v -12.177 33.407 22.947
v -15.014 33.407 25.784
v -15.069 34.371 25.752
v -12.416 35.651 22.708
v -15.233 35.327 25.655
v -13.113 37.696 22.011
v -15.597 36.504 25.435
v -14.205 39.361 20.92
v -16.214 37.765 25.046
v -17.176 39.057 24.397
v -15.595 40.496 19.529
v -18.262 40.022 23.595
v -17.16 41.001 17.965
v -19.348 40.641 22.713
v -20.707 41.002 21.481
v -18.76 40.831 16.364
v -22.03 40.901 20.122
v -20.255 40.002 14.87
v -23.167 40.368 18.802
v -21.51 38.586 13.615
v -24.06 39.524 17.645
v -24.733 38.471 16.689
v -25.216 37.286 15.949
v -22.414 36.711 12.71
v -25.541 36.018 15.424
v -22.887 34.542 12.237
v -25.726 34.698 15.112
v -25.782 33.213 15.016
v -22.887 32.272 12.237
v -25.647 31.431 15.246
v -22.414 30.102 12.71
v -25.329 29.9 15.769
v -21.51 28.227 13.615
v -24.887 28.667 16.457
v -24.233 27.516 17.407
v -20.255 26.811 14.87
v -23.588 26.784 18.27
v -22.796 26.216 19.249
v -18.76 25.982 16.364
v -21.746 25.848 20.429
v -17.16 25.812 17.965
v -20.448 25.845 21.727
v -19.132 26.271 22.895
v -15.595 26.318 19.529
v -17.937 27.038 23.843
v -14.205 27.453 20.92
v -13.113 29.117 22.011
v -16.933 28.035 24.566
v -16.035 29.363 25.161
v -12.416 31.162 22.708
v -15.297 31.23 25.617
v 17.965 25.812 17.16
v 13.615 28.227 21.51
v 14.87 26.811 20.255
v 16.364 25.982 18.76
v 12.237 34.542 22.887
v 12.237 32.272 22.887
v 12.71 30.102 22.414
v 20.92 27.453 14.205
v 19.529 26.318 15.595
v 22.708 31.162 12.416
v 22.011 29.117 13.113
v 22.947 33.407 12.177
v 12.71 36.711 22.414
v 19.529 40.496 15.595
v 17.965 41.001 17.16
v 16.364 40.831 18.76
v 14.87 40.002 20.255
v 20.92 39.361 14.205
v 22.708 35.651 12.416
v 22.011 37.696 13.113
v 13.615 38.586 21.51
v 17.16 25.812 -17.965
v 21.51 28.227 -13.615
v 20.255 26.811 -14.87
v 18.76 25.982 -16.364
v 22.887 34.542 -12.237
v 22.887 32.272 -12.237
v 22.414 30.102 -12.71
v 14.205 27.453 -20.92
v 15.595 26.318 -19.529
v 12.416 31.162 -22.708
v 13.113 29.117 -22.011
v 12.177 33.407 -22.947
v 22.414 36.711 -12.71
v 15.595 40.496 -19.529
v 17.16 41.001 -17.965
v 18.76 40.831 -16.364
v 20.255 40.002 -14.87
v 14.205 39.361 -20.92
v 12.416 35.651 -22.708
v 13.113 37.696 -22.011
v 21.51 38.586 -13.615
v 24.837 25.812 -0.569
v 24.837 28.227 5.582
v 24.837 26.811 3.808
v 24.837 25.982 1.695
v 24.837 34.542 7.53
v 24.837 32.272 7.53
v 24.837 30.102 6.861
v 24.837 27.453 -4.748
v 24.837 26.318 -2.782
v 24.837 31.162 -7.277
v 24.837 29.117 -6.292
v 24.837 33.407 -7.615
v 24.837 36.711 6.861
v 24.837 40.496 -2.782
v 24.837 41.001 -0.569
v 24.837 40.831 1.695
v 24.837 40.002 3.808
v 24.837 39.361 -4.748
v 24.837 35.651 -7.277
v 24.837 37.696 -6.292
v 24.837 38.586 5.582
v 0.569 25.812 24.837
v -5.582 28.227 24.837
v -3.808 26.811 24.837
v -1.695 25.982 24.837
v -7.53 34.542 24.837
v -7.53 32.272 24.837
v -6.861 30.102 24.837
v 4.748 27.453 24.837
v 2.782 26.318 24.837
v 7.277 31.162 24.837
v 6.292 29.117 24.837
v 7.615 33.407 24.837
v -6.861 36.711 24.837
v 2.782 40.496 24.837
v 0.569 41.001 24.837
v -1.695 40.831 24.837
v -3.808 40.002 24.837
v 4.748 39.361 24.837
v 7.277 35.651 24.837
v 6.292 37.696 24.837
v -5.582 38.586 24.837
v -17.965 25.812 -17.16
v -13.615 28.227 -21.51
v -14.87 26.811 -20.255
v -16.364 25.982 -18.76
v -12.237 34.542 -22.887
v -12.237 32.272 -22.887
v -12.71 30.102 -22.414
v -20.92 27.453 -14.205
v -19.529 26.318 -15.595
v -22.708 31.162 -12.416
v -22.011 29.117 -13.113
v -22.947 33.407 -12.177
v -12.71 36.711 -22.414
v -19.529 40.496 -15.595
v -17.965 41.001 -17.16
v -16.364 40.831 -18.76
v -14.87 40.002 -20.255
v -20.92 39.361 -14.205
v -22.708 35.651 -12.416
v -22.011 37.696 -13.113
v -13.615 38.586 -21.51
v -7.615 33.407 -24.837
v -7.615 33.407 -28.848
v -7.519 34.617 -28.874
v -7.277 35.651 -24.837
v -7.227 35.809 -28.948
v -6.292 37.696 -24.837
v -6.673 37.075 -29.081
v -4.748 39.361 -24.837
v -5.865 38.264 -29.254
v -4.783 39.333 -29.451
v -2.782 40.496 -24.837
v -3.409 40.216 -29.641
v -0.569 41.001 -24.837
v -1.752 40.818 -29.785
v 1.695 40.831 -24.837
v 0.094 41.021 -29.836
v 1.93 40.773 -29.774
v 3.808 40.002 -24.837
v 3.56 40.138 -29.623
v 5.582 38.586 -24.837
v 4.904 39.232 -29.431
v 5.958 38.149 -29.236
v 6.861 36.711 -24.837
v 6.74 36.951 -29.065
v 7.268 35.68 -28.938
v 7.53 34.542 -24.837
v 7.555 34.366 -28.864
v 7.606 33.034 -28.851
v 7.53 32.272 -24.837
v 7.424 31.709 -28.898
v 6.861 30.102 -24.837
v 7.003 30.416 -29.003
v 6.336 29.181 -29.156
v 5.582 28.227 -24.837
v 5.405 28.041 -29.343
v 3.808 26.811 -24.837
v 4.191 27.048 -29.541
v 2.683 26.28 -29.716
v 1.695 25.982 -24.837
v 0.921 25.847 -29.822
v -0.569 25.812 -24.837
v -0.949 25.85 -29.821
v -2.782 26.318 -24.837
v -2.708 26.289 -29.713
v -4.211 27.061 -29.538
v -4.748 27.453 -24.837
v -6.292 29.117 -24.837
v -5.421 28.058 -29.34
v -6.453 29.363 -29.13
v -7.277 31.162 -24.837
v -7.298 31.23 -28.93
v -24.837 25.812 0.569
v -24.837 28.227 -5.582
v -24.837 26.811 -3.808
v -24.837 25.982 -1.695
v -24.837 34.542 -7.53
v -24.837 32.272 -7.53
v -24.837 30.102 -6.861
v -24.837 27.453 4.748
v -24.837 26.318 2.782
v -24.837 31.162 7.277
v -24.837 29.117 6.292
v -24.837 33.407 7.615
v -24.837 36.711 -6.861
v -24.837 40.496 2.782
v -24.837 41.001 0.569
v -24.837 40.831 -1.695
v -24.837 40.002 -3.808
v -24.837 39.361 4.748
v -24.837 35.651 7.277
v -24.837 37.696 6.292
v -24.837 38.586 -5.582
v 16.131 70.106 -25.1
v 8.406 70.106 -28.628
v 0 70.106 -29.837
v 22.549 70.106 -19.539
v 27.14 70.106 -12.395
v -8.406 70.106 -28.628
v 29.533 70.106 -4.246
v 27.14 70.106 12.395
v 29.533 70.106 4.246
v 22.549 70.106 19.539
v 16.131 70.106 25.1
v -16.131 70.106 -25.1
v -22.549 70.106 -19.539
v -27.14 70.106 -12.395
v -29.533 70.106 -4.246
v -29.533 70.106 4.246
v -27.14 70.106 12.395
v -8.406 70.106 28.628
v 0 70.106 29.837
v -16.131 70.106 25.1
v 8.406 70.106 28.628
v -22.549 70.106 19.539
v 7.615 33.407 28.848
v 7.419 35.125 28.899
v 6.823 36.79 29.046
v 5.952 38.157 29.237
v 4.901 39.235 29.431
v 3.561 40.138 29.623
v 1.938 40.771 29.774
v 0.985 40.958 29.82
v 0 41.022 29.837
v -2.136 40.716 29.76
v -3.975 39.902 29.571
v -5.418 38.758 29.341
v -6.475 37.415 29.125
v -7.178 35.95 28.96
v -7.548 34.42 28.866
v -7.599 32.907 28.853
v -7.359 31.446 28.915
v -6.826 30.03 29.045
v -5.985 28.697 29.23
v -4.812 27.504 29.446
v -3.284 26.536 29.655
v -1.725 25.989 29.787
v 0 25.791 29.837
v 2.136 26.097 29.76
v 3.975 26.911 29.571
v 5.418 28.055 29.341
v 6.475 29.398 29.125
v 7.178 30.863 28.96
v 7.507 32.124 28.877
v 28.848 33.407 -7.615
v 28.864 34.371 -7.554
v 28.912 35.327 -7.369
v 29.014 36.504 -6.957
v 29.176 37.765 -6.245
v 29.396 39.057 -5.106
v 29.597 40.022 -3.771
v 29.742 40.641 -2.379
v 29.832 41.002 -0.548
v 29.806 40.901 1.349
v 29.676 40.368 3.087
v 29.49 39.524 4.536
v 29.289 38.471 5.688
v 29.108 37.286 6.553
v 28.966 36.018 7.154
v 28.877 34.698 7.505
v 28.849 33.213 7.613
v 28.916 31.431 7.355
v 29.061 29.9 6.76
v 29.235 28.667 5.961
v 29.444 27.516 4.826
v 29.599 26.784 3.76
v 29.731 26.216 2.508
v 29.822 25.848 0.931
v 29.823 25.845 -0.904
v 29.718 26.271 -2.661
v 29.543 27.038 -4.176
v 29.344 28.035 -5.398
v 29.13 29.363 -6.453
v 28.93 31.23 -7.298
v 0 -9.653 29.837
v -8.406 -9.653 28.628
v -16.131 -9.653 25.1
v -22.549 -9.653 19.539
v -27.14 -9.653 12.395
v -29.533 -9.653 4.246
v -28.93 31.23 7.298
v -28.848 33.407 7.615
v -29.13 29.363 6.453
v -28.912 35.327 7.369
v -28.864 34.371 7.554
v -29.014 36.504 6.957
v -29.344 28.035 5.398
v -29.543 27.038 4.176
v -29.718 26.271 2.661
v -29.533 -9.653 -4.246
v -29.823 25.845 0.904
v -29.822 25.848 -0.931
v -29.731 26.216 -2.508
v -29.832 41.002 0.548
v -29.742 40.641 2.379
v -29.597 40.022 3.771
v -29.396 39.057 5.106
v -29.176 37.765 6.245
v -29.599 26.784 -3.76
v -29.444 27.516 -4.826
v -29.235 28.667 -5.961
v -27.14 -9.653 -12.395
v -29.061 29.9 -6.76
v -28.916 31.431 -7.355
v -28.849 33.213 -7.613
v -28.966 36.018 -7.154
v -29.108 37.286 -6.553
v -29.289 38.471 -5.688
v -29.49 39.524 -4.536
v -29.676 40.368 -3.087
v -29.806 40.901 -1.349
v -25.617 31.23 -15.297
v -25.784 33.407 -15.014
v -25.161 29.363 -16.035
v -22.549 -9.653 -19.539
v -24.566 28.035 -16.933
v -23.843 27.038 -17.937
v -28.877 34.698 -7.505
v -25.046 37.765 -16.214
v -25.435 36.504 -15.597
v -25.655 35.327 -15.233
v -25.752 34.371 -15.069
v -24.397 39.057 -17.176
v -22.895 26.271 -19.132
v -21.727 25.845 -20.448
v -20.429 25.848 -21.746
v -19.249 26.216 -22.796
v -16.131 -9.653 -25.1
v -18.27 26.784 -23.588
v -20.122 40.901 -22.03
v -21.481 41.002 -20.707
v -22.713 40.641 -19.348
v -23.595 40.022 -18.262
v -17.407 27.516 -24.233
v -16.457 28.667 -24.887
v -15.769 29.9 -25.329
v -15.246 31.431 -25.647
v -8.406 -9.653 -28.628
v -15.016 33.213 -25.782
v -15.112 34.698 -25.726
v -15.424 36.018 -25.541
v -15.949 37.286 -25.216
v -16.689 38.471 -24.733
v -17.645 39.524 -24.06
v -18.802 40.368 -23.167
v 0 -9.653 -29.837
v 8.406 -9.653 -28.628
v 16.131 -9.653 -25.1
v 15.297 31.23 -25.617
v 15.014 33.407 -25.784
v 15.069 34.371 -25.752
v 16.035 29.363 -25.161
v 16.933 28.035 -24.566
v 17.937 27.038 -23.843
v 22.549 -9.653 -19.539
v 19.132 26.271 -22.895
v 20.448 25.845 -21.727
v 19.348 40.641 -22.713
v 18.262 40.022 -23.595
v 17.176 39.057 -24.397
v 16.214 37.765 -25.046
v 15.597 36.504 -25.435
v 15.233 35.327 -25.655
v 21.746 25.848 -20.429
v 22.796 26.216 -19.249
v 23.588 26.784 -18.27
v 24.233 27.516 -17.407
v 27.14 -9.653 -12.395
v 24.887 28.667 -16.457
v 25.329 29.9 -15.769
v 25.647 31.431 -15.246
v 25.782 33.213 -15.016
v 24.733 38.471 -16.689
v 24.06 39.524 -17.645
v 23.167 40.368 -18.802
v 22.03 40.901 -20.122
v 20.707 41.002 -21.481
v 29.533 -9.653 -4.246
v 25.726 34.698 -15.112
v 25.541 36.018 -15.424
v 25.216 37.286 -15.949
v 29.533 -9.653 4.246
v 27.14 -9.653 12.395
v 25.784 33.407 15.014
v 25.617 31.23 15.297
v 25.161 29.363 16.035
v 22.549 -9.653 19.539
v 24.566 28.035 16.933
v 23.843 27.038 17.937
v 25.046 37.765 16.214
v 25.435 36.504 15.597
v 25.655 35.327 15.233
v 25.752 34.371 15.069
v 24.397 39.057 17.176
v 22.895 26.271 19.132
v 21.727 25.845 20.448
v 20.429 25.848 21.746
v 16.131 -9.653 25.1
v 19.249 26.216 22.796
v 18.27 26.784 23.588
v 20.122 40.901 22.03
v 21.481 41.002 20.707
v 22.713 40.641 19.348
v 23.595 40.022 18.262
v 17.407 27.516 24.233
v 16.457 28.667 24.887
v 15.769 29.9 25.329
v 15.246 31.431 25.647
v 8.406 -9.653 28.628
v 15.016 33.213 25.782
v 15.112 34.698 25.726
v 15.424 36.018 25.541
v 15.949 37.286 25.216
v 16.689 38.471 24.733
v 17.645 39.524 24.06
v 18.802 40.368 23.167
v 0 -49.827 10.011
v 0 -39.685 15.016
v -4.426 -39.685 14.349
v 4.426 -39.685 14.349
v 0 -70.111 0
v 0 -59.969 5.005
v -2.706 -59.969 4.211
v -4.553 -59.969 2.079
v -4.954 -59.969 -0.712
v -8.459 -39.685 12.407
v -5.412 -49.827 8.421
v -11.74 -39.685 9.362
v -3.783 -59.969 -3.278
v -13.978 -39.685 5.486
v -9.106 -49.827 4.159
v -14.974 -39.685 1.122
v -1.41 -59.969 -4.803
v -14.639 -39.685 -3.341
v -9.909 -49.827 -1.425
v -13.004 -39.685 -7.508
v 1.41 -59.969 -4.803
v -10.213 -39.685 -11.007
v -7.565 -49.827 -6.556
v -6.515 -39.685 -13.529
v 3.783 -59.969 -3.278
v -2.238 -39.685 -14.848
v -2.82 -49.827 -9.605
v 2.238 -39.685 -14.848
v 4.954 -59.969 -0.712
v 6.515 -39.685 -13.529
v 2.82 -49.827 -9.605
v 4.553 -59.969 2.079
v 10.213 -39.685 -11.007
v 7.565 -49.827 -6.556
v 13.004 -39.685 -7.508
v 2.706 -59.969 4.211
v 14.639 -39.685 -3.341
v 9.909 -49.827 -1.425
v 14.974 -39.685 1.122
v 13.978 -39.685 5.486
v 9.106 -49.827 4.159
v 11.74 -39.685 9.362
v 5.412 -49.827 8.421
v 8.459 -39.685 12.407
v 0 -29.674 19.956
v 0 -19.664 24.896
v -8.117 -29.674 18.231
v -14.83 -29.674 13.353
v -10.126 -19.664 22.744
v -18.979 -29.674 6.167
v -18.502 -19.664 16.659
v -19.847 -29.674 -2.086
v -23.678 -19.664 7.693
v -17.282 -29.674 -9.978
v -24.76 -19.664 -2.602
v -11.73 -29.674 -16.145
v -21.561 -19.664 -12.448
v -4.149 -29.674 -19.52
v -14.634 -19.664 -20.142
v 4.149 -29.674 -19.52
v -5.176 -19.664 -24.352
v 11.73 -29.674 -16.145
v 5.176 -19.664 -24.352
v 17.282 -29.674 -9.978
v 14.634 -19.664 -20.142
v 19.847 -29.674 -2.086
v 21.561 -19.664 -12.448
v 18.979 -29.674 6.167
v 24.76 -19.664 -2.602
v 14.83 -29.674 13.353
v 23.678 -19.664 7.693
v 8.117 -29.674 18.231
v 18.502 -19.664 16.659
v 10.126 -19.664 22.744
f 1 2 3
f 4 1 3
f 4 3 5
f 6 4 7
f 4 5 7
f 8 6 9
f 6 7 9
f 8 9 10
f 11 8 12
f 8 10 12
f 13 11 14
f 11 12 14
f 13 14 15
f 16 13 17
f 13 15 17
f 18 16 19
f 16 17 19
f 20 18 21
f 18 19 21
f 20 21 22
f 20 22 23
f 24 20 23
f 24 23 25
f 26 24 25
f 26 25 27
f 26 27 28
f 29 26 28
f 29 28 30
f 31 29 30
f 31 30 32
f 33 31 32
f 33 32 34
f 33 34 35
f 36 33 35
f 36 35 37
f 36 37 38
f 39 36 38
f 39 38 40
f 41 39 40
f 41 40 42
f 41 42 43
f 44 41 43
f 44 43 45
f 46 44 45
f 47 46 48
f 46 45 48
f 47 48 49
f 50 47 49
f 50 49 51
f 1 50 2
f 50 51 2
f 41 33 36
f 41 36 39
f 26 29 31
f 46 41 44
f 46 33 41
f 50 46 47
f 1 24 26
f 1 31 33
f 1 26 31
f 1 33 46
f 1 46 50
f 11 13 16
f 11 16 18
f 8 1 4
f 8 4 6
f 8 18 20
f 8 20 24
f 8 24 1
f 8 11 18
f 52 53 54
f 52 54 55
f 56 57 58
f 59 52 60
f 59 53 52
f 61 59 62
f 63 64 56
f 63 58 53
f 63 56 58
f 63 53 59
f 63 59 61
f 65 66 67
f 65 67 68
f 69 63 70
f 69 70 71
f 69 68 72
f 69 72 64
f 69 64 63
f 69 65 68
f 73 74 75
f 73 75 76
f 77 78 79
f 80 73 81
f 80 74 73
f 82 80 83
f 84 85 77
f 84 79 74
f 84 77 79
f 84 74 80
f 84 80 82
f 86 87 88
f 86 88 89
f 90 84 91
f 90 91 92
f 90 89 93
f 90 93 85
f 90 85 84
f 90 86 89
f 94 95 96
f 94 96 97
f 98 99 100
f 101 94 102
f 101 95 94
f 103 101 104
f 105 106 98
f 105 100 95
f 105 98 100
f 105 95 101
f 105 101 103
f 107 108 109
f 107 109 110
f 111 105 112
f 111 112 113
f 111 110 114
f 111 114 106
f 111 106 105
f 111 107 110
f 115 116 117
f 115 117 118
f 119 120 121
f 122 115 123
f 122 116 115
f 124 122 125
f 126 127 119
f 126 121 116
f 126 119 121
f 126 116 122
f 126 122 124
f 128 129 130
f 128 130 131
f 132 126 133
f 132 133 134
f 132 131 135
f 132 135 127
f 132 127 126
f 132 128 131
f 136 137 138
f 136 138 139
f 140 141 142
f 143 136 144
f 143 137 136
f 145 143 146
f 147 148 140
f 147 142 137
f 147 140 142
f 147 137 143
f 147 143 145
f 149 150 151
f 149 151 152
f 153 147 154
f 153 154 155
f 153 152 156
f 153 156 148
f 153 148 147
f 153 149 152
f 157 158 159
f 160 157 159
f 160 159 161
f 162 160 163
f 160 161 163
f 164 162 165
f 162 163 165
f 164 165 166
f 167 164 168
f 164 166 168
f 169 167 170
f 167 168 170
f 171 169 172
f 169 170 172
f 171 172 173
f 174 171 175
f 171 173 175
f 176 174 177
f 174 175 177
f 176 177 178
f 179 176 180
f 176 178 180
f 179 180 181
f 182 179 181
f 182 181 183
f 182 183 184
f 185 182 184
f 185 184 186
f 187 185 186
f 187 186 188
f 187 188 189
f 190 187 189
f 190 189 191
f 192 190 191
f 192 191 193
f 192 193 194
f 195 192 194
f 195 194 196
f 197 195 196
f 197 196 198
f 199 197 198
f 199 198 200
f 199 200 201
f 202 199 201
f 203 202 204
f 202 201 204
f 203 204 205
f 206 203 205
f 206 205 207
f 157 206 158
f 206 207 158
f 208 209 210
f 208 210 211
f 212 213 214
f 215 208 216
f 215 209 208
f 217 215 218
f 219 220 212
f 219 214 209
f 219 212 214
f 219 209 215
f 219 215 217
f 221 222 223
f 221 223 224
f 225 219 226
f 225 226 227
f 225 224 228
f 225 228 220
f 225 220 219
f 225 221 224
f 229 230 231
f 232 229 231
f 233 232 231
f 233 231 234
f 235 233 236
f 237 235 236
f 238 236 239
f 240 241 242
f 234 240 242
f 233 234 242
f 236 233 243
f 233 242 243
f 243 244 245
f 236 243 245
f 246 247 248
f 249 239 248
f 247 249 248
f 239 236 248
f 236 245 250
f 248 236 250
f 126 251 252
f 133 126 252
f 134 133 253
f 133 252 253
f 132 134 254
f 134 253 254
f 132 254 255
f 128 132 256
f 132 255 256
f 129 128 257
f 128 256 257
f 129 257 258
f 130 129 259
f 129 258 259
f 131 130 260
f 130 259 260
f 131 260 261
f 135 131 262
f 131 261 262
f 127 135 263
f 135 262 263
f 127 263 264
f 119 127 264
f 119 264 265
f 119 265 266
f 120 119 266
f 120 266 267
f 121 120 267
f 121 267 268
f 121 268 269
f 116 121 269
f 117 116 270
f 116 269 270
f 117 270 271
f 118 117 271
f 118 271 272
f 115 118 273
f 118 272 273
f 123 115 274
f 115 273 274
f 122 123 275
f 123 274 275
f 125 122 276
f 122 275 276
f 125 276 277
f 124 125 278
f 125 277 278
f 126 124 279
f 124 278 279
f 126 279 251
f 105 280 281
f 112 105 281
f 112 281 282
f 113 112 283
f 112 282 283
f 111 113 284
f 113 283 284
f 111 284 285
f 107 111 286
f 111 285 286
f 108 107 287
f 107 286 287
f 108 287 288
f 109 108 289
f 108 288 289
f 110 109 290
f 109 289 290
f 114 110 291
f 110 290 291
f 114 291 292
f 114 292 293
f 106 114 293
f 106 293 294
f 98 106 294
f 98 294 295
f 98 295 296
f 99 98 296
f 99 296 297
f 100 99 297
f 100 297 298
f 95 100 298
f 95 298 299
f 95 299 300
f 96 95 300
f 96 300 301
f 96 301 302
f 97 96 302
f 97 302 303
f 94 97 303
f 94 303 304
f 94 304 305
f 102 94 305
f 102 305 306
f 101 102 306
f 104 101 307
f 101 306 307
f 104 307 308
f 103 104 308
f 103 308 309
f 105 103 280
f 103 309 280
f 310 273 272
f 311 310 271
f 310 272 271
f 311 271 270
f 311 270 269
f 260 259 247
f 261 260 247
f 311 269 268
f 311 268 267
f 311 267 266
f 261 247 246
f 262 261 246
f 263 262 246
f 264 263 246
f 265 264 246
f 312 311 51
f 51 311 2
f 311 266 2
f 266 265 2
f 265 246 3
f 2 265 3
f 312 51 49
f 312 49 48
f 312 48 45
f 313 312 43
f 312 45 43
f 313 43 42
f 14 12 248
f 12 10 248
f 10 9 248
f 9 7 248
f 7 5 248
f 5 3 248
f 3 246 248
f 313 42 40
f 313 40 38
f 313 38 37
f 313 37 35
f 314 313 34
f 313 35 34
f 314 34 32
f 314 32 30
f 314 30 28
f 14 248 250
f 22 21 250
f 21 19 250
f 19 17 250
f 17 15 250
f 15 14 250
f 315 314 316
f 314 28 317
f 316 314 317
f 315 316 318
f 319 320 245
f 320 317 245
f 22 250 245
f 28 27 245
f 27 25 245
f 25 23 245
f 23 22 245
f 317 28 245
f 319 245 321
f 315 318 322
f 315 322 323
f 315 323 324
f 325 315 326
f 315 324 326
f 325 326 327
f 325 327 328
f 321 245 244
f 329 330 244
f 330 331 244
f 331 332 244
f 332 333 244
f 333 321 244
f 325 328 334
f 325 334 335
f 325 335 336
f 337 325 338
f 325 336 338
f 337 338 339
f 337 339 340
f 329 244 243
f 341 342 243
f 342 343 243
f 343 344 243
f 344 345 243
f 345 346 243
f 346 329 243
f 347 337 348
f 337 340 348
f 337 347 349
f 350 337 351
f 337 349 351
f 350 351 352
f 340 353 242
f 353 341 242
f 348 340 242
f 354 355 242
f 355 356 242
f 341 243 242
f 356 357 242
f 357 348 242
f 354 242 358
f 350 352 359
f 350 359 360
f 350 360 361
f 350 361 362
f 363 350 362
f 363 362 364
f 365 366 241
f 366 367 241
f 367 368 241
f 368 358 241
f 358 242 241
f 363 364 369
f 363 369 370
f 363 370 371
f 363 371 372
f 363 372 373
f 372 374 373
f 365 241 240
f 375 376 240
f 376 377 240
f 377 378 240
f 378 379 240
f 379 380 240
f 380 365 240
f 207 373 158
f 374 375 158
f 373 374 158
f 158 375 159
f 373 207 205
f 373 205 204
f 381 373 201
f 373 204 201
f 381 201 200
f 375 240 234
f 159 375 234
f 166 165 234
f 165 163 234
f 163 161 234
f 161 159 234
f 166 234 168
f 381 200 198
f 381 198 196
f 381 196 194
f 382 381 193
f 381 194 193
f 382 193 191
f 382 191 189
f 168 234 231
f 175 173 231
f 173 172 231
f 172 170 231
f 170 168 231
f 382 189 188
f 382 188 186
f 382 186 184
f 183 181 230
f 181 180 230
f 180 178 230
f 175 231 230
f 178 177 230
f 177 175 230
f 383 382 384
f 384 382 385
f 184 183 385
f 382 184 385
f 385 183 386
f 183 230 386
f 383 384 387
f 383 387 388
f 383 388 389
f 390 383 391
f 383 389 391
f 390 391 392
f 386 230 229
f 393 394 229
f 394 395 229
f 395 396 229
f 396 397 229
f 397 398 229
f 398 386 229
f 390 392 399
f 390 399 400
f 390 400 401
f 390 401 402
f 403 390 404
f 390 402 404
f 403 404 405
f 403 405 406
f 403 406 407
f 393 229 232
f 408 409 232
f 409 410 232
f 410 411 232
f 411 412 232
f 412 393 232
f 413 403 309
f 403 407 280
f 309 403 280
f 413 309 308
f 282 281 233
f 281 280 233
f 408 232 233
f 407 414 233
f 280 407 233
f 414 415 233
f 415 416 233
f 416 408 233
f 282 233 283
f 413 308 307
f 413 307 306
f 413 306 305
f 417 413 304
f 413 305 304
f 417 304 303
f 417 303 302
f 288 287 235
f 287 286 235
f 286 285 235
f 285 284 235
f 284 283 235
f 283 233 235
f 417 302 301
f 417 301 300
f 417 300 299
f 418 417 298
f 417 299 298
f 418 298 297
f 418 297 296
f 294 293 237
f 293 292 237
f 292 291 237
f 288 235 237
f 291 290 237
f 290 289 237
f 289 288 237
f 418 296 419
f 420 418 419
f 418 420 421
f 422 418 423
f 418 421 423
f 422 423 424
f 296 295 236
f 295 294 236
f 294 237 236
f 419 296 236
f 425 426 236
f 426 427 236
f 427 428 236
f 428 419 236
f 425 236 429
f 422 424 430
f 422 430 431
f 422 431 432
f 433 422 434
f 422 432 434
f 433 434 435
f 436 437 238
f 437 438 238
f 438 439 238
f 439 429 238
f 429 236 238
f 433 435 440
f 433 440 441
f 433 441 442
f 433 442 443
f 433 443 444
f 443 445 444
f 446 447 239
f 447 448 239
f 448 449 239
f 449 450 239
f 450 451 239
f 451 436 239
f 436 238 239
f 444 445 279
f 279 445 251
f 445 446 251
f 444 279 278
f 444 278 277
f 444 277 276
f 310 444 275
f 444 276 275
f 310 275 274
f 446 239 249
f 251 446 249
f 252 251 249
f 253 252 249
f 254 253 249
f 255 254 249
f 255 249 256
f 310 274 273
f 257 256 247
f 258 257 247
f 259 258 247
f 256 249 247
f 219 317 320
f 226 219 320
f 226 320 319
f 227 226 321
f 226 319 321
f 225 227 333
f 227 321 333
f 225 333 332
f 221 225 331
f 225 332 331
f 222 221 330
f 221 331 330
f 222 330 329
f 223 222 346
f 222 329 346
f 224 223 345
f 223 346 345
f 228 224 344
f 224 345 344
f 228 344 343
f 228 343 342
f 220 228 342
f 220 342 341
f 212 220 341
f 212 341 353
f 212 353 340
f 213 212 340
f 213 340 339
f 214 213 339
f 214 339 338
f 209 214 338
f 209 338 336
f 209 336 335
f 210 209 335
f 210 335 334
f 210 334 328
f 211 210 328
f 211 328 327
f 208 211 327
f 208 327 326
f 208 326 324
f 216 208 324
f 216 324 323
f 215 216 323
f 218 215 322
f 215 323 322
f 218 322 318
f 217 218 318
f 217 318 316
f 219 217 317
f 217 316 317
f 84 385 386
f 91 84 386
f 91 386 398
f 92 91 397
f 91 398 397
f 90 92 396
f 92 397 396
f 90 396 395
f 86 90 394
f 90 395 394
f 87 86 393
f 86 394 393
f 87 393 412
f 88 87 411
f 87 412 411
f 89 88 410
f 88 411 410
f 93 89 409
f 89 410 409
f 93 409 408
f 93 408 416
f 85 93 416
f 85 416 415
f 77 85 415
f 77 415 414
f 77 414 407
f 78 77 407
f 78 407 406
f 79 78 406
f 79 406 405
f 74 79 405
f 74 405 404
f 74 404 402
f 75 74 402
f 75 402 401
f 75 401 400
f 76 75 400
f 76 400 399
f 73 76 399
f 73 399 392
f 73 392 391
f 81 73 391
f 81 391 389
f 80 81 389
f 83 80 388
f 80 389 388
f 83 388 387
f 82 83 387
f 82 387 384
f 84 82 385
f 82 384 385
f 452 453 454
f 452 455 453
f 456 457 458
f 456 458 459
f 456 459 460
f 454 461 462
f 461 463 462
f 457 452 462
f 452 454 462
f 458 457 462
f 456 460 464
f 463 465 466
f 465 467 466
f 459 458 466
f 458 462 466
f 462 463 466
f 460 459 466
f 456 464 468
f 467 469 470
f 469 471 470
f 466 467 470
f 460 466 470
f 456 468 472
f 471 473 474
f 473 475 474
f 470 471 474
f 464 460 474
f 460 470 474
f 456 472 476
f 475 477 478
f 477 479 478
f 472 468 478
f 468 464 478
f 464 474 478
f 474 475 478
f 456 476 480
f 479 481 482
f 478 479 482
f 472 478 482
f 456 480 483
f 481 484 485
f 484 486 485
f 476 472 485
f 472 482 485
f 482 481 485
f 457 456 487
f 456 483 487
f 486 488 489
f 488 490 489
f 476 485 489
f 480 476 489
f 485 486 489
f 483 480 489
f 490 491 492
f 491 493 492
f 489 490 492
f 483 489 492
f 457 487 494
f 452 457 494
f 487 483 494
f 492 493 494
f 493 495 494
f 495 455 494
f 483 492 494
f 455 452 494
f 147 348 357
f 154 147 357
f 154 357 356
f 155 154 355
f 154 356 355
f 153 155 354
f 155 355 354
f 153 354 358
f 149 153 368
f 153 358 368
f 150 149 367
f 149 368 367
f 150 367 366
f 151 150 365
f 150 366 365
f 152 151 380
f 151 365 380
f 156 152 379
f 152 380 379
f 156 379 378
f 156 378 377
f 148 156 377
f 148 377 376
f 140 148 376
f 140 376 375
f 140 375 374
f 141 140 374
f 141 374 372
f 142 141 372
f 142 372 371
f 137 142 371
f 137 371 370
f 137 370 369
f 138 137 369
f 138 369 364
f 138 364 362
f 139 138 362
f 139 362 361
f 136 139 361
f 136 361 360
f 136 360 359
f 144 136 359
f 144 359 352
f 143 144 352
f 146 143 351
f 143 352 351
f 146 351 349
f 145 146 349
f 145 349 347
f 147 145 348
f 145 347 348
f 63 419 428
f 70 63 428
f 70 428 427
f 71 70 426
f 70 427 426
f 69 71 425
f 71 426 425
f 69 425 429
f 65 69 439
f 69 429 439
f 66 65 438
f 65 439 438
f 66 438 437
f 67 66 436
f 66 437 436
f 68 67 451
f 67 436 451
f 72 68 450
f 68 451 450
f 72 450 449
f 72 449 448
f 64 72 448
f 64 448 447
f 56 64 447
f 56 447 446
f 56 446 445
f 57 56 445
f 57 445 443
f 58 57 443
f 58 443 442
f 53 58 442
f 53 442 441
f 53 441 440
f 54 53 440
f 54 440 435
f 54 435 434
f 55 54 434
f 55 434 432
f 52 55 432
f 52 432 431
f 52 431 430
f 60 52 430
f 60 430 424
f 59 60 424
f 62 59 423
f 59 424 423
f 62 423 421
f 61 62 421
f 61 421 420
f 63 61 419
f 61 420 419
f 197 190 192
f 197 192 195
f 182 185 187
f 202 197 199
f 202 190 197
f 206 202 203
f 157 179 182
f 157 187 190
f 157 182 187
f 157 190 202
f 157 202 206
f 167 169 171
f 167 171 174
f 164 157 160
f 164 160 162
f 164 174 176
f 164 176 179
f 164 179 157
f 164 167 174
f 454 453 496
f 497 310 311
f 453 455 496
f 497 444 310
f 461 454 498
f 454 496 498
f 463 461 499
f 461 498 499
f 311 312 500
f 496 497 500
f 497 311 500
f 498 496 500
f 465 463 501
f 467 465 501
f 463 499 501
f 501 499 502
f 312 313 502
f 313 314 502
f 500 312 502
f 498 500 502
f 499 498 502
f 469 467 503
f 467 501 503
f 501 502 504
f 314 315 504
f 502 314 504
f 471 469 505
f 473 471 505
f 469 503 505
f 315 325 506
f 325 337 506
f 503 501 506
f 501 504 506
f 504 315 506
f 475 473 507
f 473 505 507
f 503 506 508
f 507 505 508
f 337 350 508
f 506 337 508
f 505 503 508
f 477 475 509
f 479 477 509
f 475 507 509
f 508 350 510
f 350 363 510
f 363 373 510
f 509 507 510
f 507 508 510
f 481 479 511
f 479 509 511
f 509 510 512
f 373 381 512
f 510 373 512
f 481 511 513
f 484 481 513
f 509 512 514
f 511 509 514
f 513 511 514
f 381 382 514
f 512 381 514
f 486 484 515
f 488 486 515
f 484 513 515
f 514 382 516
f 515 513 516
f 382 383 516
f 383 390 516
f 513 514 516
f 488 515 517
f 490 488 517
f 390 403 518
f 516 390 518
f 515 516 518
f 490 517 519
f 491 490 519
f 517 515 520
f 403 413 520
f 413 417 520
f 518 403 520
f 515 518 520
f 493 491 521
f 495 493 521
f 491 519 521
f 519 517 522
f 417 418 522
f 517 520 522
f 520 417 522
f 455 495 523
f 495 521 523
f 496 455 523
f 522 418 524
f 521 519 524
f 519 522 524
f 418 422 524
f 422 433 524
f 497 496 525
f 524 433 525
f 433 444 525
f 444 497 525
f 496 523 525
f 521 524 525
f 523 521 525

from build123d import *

# Parameters (mm, degrees)
SKETCH2_R          = 7.615394345
CUT_EXTRUDE1_DEPTH = 5
CIRPATTERN1_COUNT  = 8


with BuildPart() as part:
    # Sketch1 → Revolve1 (revolve)
    with BuildSketch(Plane.XY, mode=Mode.PRIVATE) as revolve1_sk:
        Polygon((-29.836570739, 70.106190724), (0, 70.106190724), (0, -39.684589186), (0, -70.111322573), (-15.015790503, -39.684589186), (-29.836570739, -9.65300818), align=None)
    revolve(revolve1_sk.sketch.rotate(Axis((0, 70.106190724, 0), (0, -1, 0)), 270), axis=Axis((0, 70.106190724, 0), (0, -1, 0)))

    # Sketch2 → Cut-Extrude1 (cut)
    with BuildSketch(Plane.XY.offset(29.836570739)):
        with Locations((0, 33.406581413)):
            Circle(SKETCH2_R)
    cut_extrude1 = extrude(amount=-CUT_EXTRUDE1_DEPTH, mode=Mode.SUBTRACT)

    # CirPattern1: Cut-Extrude1 ×8 about axis
    cirpattern1_axis = Axis((0, 0, 0), (0, 1, 0))
    for i in range(1, CIRPATTERN1_COUNT):
        add(cut_extrude1.rotate(cirpattern1_axis, i * 360 / CIRPATTERN1_COUNT), mode=Mode.SUBTRACT)


solid = part.part
